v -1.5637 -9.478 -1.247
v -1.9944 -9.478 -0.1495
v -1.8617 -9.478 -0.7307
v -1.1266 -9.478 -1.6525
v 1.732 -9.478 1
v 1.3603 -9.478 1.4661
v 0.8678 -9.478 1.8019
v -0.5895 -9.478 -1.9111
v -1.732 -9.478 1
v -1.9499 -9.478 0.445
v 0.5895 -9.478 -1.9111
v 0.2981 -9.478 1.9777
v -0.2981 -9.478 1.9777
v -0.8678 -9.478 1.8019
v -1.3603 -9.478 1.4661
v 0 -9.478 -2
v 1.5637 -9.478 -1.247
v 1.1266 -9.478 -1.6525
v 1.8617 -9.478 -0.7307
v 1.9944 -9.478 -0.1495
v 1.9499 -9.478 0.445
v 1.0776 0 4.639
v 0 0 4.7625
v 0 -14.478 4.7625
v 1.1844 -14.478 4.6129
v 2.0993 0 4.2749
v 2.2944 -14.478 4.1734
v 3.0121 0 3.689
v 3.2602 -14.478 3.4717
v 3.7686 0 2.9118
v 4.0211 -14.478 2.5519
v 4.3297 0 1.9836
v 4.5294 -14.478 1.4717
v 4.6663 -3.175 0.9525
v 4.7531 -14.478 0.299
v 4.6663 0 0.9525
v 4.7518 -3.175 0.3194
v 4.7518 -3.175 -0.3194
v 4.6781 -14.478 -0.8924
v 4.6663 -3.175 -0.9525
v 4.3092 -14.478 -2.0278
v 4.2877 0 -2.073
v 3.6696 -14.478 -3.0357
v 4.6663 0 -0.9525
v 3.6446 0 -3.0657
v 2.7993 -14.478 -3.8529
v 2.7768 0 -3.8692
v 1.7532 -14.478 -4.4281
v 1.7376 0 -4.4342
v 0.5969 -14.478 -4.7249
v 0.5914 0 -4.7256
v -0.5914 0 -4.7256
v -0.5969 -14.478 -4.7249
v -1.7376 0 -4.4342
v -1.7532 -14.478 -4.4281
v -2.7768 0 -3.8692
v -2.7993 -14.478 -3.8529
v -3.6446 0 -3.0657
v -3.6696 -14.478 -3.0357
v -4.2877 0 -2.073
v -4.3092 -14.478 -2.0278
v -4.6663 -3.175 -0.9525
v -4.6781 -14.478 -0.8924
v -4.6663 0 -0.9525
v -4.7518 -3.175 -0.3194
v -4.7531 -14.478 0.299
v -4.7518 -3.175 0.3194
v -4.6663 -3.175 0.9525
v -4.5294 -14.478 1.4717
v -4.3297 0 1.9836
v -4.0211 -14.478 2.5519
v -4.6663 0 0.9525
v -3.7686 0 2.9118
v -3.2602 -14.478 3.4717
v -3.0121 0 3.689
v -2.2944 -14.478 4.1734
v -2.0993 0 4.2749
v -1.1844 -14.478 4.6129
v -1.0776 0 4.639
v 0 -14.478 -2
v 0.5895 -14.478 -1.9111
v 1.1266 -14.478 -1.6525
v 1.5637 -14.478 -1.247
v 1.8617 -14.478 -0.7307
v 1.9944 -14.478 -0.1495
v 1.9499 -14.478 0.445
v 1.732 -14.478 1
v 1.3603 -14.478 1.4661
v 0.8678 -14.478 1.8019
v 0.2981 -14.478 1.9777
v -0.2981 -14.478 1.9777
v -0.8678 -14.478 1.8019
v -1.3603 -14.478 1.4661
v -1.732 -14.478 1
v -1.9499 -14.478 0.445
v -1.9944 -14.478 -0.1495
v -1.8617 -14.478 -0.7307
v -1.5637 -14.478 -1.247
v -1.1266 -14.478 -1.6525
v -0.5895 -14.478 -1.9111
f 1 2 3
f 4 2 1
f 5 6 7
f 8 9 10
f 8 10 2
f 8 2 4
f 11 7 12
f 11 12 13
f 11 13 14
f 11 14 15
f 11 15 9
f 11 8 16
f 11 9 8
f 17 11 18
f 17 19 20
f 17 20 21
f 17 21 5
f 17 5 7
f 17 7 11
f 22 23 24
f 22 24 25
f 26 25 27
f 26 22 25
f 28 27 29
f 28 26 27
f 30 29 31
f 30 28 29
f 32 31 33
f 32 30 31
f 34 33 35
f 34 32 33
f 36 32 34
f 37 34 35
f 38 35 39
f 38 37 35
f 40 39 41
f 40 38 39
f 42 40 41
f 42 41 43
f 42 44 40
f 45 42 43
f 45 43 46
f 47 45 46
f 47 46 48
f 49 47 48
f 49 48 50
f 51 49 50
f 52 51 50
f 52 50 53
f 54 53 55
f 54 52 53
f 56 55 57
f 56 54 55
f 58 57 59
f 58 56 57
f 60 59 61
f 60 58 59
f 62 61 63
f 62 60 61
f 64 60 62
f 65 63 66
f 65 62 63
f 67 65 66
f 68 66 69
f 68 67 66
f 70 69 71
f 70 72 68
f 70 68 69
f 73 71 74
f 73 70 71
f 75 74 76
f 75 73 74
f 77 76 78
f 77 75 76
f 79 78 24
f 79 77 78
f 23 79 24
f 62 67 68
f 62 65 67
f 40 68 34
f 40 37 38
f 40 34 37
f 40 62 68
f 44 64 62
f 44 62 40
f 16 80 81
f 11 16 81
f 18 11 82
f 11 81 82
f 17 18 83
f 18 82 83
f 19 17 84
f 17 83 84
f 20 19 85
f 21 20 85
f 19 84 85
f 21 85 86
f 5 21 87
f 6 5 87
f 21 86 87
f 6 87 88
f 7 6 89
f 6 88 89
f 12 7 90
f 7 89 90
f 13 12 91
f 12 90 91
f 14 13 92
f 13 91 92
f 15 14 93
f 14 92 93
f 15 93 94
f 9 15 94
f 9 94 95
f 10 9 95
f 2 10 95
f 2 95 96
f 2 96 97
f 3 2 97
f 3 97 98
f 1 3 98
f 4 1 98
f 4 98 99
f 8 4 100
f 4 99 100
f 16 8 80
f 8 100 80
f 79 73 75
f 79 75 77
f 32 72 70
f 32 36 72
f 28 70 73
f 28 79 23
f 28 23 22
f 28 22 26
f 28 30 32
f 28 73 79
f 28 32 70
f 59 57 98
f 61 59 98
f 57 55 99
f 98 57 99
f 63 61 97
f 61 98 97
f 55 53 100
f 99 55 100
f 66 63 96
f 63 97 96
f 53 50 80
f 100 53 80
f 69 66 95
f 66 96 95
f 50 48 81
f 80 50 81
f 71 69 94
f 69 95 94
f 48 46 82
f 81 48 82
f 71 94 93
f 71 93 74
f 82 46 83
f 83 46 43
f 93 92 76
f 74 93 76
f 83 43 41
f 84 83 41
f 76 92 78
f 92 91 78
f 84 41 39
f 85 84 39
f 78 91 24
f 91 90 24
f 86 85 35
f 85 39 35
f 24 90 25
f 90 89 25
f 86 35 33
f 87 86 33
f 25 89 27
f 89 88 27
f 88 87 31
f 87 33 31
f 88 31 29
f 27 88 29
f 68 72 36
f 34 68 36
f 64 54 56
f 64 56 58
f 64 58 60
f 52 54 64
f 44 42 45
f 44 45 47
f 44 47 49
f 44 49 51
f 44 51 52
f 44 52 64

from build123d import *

# Parameters (mm, degrees)
SKETCH1_R           = 4.7625
BOSS_EXTRUDE1_DEPTH = 14.478
SKETCH2_W           = 9.525
SKETCH2_H           = 1.905
CUT_EXTRUDE1_DEPTH  = 3.175
SKETCH3_R           = 1.999996
CUT_EXTRUDE2_DEPTH  = 5


with BuildPart() as part:
    # Sketch1 → Boss-Extrude1 (new body)
    with BuildSketch(Plane(origin=(0, 0, 0), x_dir=(1, 0, 0), z_dir=(0, 1, 0))):
        with Locations(Location((0, 0, 0), (0, 0, 270))):
            Circle(SKETCH1_R)
    extrude(amount=-BOSS_EXTRUDE1_DEPTH)

    # Sketch2 → Cut-Extrude1 (cut)
    with BuildSketch(Plane(origin=(0, 0, 0), x_dir=(1, 0, 0), z_dir=(0, 1, 0))):
        Rectangle(SKETCH2_W, SKETCH2_H)
    extrude(amount=-CUT_EXTRUDE1_DEPTH, mode=Mode.SUBTRACT)

    # Sketch3 → Cut-Extrude2 (cut)
    with BuildSketch(Plane.XZ.offset(14.478)):
        with Locations(Location((0, 0, 0), (0, 0, 270))):
            Circle(SKETCH3_R)
    extrude(amount=-CUT_EXTRUDE2_DEPTH, mode=Mode.SUBTRACT)


solid = part.part
